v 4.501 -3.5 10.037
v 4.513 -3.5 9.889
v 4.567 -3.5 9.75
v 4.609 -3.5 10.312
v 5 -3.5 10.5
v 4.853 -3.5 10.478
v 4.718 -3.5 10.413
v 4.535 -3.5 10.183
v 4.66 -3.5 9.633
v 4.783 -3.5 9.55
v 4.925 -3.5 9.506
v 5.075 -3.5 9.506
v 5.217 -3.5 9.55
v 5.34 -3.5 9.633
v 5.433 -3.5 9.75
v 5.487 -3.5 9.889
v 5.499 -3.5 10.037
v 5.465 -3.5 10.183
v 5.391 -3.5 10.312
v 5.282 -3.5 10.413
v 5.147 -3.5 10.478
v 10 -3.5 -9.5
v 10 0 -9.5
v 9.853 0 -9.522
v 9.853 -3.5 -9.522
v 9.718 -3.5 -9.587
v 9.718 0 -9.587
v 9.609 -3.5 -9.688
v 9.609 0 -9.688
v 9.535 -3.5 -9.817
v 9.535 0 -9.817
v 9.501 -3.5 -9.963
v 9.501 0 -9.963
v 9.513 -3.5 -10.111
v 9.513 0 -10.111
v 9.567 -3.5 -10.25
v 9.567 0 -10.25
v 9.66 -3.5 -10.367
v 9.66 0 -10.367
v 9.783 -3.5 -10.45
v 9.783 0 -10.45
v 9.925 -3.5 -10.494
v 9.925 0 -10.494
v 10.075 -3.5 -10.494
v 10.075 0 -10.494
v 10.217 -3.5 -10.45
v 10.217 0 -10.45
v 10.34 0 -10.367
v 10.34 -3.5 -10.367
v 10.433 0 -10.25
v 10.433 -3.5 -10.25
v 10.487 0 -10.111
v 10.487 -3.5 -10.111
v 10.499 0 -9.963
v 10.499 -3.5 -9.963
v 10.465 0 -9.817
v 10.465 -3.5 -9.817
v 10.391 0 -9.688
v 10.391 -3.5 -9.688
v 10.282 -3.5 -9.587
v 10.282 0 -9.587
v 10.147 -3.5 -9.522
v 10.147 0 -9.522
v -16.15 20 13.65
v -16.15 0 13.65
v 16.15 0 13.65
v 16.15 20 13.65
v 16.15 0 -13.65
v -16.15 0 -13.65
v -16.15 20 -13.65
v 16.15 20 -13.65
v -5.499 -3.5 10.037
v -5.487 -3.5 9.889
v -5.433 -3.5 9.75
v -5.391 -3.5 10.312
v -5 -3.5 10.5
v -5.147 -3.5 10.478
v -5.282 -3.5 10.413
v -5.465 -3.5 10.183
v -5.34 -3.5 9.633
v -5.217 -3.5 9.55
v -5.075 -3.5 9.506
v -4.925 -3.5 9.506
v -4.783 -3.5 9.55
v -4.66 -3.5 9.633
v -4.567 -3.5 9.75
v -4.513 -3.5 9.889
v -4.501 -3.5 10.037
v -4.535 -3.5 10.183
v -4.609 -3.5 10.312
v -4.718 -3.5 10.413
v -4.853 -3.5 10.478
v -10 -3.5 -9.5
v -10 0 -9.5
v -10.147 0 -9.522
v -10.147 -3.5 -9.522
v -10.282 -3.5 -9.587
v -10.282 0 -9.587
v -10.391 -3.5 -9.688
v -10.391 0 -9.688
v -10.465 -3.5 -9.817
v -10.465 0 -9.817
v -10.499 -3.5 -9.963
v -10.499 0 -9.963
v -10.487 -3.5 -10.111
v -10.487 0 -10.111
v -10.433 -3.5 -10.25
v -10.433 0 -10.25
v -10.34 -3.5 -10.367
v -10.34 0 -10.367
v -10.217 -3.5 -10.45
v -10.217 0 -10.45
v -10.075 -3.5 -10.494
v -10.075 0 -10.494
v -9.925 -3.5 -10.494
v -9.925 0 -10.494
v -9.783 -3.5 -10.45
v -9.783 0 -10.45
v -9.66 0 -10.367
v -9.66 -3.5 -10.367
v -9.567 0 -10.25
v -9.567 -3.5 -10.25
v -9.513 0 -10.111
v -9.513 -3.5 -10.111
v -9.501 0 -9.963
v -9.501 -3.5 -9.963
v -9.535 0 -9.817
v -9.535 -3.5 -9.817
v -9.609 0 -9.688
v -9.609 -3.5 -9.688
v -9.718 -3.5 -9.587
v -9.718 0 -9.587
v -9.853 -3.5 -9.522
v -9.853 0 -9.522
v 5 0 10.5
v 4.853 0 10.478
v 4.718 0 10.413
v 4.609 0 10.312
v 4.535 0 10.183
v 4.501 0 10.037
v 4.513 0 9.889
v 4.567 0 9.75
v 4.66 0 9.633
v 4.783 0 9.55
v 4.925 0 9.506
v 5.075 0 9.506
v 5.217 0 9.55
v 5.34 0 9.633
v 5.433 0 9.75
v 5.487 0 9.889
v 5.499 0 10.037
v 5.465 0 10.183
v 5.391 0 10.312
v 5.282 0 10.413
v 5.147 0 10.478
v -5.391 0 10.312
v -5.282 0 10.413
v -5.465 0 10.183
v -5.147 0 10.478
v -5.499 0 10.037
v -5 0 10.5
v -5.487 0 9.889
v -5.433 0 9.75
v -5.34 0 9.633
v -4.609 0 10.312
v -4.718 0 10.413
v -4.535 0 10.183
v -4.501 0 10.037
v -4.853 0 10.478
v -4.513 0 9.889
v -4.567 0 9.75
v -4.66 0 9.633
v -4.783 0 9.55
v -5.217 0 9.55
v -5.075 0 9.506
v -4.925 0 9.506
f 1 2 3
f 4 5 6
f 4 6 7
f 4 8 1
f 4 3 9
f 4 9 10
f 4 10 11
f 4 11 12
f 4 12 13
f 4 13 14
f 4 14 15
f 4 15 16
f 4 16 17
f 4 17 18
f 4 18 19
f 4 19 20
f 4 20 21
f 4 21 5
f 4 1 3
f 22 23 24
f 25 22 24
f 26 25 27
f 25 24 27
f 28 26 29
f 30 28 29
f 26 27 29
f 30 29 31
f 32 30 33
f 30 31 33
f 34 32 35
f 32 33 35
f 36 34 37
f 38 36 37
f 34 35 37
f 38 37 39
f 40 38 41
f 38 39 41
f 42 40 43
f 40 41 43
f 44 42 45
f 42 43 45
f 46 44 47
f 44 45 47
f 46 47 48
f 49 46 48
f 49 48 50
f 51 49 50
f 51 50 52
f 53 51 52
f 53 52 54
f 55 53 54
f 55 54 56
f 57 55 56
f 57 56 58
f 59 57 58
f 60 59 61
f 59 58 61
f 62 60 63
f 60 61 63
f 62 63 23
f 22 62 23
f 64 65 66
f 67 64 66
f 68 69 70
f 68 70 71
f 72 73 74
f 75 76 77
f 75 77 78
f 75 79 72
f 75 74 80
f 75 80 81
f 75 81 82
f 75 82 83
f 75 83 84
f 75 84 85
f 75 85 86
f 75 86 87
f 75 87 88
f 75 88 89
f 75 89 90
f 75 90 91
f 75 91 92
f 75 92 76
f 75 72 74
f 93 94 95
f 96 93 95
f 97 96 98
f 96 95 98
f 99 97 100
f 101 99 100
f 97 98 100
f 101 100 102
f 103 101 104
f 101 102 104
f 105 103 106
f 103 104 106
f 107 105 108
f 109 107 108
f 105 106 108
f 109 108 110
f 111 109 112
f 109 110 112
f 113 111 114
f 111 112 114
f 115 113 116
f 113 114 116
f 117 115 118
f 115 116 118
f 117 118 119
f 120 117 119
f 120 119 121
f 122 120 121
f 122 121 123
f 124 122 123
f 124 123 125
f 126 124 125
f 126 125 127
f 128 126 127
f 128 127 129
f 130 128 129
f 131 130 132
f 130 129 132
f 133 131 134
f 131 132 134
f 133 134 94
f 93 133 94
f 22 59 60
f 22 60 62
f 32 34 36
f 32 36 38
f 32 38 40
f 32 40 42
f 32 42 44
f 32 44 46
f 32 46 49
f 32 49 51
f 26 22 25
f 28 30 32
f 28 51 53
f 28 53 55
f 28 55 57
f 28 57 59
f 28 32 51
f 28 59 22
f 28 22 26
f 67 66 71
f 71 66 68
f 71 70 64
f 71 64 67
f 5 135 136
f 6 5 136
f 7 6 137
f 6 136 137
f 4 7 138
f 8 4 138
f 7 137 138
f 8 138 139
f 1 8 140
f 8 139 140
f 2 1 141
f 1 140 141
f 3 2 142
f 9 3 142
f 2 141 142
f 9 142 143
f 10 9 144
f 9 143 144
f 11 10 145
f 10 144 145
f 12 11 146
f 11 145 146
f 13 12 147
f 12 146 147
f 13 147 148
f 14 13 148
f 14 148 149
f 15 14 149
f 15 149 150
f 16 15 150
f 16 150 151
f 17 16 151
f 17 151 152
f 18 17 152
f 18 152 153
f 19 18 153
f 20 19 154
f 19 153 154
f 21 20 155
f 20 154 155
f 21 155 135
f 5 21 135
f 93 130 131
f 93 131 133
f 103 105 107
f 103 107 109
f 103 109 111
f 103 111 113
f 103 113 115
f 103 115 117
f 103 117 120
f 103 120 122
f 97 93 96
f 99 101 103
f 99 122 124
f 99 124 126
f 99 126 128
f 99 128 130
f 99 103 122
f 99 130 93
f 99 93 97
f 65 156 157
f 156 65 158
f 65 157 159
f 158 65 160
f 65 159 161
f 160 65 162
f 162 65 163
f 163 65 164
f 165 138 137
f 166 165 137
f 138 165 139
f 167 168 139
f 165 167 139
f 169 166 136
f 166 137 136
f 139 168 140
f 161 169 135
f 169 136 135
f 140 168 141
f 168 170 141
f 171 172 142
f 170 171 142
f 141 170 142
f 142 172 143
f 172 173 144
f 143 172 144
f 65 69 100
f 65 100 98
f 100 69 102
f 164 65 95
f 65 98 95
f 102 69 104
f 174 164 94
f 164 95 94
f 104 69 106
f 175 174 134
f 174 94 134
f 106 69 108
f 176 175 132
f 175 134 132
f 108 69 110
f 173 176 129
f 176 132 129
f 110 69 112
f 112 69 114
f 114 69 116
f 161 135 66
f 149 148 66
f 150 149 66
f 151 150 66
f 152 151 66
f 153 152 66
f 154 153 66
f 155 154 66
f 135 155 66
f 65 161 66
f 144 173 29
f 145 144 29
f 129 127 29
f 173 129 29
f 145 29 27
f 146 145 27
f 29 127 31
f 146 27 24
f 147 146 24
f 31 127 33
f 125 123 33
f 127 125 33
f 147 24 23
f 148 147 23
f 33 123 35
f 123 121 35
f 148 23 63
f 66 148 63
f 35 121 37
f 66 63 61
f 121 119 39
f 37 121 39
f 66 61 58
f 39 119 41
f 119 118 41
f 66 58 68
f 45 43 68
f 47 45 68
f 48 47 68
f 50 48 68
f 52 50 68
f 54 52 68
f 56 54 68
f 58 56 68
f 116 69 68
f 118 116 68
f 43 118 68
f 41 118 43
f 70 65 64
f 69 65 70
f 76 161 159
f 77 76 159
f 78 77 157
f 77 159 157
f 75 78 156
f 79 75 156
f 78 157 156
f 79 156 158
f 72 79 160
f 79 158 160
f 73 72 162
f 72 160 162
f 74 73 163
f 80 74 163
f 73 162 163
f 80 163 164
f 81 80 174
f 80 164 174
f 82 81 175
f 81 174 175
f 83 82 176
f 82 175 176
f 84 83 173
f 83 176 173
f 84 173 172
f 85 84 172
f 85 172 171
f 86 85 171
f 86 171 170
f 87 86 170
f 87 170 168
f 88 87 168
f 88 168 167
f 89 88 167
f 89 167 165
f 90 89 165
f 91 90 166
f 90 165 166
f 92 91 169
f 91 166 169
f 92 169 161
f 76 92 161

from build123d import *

# Parameters (mm, degrees)
SKETCH1_W            = 32.3
SKETCH1_H            = 27.3
BASE_EXTRUSION_DEPTH = 20
SKETCH2_R            = 0.5
PINS_DEPTH           = 3.5


with BuildPart() as part:
    # Sketch1 → Base Extrusion (new body)
    with BuildSketch(Plane(origin=(0, 0, 0), x_dir=(1, 0, 0), z_dir=(0, 1, 0))):
        Rectangle(SKETCH1_W, SKETCH1_H)
    extrude(amount=BASE_EXTRUSION_DEPTH)

    # Sketch2 → Pins (add)
    with BuildSketch(Plane.XZ):
        with Locations(Location((-5, 10, 0), (0, 0, 90))):
            Circle(SKETCH2_R)
        with Locations(Location((5, 10, 0), (0, 0, 90))):
            Circle(SKETCH2_R)
        with Locations(Location((-10, -10, 0), (0, 0, 90))):
            Circle(SKETCH2_R)
        with Locations(Location((10, -10, 0), (0, 0, 90))):
            Circle(SKETCH2_R)
    extrude(amount=PINS_DEPTH)


solid = part.part
